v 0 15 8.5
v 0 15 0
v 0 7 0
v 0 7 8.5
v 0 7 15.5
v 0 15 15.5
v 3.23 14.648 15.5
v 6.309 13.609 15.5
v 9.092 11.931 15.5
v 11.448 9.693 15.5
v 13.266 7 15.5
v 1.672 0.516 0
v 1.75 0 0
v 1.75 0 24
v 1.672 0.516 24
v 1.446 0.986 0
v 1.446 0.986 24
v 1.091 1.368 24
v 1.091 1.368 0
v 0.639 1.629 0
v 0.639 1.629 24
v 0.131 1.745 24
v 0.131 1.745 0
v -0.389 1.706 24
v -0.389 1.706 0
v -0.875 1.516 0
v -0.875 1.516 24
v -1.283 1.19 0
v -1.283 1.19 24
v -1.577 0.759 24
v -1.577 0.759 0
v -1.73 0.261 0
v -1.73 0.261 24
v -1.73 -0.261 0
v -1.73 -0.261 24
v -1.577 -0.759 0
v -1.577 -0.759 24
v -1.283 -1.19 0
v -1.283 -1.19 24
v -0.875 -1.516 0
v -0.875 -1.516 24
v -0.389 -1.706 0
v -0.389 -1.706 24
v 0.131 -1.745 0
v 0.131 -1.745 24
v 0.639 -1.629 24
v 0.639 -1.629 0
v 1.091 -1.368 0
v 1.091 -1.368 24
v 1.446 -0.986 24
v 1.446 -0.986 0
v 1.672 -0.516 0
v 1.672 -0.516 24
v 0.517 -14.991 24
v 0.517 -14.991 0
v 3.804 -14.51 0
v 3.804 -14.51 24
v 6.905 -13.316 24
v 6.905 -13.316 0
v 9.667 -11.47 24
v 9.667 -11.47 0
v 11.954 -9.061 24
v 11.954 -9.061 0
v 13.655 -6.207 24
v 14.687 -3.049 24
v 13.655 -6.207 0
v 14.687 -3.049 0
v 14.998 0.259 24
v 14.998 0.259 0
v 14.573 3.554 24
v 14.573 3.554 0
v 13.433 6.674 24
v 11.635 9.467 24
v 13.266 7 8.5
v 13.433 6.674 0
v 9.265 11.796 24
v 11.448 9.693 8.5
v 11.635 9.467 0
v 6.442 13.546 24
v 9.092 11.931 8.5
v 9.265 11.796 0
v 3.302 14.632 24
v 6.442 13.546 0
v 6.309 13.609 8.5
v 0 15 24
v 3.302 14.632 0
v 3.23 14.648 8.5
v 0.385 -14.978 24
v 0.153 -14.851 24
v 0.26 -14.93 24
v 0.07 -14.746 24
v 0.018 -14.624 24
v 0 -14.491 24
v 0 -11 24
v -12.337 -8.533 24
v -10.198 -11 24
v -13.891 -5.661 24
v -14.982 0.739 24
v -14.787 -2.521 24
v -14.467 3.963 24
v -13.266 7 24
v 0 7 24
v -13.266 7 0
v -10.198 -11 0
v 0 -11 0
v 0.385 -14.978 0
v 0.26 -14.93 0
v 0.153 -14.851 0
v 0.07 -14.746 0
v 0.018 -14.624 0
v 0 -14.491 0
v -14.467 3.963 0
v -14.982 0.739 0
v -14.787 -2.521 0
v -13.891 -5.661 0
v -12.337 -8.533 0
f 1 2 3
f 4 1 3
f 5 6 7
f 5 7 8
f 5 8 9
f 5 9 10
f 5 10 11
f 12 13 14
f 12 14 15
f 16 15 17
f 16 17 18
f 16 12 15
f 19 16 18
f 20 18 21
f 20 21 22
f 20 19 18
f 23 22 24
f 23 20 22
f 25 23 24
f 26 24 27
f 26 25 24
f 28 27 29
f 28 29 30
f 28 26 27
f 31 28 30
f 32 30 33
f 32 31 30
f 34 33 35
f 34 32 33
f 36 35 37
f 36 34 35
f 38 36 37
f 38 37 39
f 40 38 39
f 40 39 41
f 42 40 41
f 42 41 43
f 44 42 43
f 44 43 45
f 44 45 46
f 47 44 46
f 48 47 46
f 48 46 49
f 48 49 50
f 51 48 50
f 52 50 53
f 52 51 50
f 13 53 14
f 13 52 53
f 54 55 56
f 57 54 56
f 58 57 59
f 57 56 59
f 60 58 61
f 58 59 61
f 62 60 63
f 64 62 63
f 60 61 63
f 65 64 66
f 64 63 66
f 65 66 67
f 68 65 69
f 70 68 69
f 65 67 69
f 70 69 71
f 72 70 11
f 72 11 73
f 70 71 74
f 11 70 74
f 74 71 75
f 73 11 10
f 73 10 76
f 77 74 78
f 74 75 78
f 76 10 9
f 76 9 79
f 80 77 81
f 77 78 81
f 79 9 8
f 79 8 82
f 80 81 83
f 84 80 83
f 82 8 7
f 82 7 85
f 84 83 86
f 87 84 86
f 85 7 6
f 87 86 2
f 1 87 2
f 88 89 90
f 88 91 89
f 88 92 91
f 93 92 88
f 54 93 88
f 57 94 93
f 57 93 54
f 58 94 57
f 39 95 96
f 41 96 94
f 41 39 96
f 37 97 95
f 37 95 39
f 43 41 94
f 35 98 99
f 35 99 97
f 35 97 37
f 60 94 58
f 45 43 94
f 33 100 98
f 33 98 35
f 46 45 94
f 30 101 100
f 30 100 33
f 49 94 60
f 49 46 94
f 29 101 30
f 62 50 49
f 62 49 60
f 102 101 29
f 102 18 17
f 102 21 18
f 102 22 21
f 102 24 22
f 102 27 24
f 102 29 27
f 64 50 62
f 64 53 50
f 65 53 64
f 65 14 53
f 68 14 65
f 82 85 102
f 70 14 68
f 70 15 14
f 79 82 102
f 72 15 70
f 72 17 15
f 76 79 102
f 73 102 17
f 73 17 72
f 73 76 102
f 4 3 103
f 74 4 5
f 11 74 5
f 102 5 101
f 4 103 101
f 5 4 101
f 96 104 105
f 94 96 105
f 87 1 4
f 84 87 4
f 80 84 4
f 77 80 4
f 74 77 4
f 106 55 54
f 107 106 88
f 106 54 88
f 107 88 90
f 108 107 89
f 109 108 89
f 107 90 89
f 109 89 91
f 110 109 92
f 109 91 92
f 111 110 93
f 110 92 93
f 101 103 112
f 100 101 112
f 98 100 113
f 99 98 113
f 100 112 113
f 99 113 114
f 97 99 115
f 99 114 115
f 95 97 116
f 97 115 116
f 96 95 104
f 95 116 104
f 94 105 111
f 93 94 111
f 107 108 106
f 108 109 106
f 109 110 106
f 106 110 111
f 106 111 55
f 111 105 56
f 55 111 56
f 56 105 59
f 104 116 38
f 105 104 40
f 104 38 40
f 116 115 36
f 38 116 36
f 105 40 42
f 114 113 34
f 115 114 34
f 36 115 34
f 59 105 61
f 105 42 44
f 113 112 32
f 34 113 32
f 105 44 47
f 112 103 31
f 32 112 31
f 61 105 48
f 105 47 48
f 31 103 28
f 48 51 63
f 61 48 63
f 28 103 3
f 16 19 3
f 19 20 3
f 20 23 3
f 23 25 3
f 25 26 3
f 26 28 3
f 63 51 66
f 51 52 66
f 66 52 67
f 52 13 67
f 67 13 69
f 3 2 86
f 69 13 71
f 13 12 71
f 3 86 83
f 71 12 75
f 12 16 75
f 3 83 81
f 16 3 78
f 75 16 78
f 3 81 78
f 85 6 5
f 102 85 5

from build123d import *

# Parameters (mm, degrees)
F0_R     = 1.75
F1_DEPTH = 24
F2_R     = 0.5
F3_W     = 8
F3_H     = 7
F4_DEPTH = 15.001


with BuildPart() as f1:
    # F0 (on Top) → F1 (new body)
    with BuildSketch(Plane.XY):
        with BuildLine():
            Line((0, 7), (-13.266499, 7))
            ThreePointArc((-13.266499, 7), (-14.786688, -2.520687), (-10.198039, -11))
            Line((-10.198039, -11), (0, -11))
            Line((0, -11), (0, -15))
            ThreePointArc((0, -15), (15, 0), (0, 15))
            Line((0, 15), (0, 7))
        make_face()
        Circle(F0_R, mode=Mode.SUBTRACT)
    extrude(amount=F1_DEPTH)

    # F2
    f2_edges = [f1.edges().sort_by_distance(p)[0] for p in [
        (0, -15, 12),
    ]]
    fillet(f2_edges, radius=F2_R)

    # F3 (on face) → F4 (cut, through all)
    with BuildSketch(Plane(origin=(0, 0, 0), x_dir=(0, -1, 0), z_dir=(-1, 0, 0))):
        with Locations((-11, 12)):
            Rectangle(F3_W, F3_H)
    extrude(amount=-F4_DEPTH, mode=Mode.SUBTRACT)


solid = f1.part
